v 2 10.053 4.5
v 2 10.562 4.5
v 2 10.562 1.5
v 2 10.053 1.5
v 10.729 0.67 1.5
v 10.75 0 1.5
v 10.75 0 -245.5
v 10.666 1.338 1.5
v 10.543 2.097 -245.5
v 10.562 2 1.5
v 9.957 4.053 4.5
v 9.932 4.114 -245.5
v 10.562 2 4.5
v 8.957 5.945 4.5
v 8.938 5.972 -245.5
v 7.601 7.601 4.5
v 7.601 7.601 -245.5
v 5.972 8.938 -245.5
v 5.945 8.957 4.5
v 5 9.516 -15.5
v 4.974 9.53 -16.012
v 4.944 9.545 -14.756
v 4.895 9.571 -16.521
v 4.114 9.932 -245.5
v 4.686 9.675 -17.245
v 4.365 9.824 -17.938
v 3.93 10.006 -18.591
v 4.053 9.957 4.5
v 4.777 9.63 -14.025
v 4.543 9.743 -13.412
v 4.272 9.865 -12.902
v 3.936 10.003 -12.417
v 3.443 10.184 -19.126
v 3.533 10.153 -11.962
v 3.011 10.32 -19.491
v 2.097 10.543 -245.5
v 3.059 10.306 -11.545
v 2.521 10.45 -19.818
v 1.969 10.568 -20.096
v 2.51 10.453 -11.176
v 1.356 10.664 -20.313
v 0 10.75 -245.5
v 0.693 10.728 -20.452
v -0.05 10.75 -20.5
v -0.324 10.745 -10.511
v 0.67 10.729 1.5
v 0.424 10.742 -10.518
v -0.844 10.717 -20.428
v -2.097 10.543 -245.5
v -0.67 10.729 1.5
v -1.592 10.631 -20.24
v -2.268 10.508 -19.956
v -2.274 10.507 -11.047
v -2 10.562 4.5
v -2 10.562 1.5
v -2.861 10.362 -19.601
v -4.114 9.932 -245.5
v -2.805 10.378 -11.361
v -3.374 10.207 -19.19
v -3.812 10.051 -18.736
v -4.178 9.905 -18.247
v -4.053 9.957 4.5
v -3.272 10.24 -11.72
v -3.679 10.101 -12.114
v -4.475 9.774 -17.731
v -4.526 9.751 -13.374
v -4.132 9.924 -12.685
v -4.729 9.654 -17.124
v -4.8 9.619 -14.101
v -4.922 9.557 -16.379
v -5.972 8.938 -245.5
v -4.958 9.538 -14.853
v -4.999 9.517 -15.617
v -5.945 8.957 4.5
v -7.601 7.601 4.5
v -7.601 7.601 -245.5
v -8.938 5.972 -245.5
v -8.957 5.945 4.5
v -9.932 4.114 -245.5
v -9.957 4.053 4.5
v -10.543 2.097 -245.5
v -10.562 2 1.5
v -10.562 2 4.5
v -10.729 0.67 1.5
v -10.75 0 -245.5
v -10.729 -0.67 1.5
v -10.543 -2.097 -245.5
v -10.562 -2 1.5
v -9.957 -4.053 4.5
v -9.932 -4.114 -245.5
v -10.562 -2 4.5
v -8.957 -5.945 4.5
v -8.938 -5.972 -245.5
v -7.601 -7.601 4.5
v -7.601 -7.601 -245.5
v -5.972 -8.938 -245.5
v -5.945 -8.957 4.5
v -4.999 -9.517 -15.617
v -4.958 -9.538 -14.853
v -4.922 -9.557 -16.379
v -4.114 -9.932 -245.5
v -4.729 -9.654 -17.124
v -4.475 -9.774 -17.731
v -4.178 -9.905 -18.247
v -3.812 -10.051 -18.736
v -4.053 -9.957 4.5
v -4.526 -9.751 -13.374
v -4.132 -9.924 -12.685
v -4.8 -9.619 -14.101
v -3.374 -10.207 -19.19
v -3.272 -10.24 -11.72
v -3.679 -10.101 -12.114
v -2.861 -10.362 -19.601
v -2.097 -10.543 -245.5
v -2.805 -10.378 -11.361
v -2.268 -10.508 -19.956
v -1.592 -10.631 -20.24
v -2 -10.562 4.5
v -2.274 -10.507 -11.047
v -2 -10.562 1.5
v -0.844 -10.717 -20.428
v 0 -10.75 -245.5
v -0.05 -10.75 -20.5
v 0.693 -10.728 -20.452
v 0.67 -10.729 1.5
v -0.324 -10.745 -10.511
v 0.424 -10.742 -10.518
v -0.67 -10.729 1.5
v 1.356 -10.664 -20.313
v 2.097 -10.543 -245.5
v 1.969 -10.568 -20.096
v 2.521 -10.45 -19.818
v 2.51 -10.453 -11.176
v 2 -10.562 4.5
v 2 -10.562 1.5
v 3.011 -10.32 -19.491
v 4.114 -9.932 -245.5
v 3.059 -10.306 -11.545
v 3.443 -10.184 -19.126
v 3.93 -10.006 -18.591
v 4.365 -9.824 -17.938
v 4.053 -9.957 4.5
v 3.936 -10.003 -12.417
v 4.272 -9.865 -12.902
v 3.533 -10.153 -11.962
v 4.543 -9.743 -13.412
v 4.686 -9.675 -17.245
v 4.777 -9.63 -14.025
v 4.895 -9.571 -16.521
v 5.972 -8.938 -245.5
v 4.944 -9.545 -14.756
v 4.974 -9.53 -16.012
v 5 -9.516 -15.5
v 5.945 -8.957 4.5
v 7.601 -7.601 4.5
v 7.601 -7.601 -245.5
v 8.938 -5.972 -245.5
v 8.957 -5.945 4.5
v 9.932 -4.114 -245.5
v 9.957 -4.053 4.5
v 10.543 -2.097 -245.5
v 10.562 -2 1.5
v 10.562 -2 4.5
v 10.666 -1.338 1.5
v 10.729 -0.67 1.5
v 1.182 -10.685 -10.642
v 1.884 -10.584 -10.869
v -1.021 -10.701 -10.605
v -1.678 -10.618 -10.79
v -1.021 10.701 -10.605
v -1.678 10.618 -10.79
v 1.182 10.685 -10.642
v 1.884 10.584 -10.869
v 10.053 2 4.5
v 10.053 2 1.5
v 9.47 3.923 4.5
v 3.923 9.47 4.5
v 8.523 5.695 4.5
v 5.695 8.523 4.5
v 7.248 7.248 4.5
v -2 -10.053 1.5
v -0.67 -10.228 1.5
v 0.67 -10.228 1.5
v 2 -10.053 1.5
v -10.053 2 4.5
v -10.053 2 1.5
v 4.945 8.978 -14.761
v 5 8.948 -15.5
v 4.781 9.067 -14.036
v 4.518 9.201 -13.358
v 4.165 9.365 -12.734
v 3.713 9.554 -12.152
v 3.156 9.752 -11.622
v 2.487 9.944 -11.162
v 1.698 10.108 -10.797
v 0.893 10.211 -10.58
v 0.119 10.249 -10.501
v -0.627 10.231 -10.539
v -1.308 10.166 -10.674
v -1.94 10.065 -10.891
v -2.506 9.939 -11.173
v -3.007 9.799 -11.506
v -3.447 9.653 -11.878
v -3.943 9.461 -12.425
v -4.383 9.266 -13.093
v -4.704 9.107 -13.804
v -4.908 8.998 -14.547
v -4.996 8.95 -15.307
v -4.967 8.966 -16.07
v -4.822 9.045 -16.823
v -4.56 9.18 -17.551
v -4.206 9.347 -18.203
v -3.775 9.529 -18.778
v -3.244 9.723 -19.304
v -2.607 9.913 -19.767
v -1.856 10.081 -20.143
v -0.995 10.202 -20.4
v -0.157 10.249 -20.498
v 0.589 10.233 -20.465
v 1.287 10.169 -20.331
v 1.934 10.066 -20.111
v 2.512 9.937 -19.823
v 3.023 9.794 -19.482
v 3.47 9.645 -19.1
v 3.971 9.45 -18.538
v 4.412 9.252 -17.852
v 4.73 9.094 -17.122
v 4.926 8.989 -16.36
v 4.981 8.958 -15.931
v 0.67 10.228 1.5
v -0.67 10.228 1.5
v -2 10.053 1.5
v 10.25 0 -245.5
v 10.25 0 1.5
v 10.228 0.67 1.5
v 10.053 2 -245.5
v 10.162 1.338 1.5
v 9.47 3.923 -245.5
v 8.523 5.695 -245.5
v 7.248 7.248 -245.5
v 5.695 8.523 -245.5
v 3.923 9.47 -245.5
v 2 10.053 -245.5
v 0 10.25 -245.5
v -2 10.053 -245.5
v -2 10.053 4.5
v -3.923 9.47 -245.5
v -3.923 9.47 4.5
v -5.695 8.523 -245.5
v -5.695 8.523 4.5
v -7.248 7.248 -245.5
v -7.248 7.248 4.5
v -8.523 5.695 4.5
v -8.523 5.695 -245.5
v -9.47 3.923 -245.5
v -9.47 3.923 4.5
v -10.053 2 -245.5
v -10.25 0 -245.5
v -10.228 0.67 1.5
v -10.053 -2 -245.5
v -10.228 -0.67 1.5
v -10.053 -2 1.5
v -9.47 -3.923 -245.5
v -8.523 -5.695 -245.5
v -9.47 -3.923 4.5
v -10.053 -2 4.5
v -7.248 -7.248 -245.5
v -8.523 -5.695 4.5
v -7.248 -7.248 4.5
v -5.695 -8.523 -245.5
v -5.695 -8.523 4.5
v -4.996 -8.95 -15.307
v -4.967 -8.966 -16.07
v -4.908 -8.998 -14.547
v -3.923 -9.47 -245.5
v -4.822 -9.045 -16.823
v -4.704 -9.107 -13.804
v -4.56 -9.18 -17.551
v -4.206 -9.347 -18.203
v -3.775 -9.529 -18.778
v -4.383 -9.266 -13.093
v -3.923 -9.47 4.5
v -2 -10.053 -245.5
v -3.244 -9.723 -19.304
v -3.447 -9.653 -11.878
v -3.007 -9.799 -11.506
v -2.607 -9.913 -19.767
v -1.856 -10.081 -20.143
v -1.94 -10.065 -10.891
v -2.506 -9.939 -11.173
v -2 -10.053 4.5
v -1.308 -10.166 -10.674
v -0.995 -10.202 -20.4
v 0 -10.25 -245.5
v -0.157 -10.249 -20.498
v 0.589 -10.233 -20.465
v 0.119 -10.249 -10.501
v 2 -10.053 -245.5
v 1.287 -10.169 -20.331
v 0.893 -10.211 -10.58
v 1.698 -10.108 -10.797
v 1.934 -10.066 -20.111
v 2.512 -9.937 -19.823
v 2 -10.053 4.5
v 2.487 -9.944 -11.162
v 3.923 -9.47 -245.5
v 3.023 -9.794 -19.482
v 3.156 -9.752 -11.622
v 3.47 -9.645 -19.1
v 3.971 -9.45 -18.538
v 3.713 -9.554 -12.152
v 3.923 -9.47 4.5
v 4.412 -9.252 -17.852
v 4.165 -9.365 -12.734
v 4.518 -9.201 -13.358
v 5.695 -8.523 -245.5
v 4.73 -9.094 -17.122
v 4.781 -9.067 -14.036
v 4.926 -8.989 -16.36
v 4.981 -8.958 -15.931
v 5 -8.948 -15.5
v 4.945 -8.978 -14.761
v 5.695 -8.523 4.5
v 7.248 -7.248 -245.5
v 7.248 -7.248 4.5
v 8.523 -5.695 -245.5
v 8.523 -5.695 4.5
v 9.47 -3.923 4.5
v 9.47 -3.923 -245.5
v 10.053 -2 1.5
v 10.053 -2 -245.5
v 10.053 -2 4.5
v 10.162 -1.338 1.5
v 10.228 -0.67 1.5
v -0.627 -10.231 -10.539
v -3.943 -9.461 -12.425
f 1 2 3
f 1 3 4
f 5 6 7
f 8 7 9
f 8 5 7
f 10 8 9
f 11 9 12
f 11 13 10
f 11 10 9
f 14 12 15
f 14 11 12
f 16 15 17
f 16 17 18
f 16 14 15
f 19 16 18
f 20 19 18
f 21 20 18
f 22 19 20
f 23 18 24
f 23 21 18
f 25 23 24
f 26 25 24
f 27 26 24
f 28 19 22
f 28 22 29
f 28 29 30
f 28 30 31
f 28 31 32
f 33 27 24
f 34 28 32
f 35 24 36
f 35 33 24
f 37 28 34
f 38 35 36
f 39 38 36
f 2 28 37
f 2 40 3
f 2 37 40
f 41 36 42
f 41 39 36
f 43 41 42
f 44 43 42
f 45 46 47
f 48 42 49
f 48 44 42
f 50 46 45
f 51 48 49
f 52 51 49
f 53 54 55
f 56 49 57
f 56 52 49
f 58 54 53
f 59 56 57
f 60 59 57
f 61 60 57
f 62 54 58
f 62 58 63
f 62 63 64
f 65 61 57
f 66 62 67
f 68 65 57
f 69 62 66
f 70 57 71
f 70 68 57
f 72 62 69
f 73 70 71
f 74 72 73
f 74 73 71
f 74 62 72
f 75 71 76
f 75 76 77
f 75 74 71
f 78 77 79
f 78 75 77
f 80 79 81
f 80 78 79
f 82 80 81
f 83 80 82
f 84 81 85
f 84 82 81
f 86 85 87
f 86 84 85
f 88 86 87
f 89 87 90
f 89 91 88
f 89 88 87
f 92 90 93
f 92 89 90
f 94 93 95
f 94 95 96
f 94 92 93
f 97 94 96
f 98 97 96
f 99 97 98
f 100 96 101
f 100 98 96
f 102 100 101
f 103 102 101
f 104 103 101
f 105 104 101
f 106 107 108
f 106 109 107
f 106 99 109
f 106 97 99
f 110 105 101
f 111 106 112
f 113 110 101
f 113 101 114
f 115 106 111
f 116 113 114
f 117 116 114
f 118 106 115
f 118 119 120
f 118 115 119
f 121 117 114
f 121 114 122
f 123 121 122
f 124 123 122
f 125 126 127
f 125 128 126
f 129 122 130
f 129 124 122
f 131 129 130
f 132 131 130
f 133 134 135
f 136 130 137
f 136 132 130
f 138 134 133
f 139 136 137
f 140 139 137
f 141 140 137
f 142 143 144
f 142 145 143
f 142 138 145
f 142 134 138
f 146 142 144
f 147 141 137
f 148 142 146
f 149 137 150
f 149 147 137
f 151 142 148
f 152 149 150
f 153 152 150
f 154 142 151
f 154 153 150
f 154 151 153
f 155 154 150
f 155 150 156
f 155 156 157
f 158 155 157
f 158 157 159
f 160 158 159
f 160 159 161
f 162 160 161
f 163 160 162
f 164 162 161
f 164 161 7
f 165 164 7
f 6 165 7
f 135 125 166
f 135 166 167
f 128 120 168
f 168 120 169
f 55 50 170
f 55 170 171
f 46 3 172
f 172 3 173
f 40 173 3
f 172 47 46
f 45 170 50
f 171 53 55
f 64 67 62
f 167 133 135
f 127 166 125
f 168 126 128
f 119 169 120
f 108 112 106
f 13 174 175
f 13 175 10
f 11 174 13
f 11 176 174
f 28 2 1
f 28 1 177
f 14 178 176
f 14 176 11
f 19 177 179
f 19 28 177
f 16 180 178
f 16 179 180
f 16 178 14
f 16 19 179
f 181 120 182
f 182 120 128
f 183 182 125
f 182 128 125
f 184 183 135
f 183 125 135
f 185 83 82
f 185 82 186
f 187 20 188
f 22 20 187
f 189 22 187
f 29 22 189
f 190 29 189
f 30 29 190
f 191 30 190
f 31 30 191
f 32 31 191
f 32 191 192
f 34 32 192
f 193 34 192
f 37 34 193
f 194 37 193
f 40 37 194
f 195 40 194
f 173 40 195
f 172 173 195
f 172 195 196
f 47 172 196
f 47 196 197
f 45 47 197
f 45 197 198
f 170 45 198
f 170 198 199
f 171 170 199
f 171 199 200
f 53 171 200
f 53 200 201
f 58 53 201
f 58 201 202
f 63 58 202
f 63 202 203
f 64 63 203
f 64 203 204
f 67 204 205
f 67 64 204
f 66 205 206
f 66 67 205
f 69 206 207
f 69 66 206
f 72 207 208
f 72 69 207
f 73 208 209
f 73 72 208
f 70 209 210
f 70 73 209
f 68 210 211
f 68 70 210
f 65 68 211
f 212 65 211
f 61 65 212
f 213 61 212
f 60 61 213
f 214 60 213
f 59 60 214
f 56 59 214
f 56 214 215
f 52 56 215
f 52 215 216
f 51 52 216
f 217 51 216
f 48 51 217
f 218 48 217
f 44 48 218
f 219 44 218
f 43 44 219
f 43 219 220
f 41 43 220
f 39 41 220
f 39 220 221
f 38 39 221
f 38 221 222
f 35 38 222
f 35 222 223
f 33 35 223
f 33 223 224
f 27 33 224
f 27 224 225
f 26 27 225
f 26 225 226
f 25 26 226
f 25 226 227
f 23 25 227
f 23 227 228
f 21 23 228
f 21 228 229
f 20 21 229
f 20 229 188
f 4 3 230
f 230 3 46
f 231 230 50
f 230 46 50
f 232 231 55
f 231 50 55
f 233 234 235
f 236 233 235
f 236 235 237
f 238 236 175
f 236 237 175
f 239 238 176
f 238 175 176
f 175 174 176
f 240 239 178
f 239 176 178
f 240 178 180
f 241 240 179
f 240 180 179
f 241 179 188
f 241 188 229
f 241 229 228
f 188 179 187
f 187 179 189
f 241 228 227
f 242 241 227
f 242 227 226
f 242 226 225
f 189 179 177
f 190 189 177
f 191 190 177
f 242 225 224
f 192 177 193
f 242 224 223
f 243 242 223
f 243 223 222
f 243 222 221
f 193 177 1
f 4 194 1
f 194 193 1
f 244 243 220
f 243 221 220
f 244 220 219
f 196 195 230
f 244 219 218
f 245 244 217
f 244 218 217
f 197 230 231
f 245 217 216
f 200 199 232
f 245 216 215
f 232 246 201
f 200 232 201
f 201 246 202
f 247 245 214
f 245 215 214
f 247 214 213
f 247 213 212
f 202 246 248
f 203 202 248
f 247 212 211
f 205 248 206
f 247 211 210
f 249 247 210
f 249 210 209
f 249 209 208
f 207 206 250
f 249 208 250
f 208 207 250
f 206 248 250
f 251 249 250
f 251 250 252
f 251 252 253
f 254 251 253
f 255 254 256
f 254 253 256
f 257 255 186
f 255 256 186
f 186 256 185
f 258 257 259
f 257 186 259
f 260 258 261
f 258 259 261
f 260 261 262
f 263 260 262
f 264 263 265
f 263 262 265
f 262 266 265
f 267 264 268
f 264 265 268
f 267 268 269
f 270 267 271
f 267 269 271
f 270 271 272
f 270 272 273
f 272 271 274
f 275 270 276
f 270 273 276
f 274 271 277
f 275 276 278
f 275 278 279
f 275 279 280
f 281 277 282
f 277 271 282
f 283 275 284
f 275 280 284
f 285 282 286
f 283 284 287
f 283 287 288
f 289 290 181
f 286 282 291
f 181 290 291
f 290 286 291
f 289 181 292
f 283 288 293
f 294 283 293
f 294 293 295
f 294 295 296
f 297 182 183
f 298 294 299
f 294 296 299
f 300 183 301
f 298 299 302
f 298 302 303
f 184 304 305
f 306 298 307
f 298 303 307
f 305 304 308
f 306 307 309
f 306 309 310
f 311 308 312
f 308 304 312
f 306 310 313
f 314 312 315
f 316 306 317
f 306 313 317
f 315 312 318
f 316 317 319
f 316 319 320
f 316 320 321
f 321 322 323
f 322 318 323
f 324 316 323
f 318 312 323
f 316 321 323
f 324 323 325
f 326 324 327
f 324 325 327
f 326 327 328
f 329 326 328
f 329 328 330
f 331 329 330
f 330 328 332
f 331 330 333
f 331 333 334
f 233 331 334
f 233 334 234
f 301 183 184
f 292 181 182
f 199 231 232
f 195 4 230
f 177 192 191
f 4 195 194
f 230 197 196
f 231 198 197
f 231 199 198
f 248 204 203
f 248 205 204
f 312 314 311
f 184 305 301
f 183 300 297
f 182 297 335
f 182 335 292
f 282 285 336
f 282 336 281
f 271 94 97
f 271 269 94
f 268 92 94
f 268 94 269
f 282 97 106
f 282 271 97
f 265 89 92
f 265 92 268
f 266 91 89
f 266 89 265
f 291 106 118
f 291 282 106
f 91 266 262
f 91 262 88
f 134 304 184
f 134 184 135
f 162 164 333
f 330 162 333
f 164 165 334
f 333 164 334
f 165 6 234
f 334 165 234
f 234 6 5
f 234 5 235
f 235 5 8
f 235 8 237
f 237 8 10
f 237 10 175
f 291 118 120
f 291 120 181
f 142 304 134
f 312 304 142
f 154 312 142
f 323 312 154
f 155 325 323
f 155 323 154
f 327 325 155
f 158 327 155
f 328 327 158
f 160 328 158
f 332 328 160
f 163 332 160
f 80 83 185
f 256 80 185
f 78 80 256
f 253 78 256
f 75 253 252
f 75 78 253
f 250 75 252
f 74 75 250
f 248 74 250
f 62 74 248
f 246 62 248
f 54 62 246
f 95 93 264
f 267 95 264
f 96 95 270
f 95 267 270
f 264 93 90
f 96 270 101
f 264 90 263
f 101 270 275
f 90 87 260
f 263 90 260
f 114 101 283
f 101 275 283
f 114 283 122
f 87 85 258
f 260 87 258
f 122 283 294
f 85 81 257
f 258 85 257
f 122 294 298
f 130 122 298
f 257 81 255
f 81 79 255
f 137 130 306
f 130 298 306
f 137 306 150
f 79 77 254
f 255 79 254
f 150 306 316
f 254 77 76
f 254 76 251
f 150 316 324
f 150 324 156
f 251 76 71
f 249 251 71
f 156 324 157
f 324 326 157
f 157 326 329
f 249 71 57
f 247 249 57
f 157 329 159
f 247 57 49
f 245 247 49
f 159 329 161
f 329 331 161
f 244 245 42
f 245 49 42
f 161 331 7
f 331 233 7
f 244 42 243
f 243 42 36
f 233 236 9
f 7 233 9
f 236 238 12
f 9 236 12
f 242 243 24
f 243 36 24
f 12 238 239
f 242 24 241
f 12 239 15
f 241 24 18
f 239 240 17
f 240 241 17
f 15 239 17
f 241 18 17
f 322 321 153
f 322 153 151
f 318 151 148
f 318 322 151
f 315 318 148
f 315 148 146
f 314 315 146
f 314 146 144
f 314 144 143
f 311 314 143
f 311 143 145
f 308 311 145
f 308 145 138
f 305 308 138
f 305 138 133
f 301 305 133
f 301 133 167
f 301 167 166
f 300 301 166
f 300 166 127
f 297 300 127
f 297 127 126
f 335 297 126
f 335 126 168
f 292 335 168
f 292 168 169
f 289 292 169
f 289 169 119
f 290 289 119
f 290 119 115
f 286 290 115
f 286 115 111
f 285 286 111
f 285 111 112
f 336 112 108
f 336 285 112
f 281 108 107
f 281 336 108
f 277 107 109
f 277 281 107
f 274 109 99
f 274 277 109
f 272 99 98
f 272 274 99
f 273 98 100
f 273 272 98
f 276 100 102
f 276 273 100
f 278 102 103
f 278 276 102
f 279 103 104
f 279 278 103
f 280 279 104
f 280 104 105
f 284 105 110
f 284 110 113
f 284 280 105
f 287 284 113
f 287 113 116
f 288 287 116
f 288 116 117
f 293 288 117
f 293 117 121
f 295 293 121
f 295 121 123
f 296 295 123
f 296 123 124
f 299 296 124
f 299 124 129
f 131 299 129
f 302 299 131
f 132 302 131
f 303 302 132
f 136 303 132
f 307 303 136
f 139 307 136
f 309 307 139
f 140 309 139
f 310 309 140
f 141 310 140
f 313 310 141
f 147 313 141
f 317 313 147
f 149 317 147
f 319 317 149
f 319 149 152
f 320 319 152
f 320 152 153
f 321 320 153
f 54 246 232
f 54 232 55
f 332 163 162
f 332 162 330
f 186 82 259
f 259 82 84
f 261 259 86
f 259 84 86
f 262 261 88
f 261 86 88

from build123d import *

# Parameters (mm, degrees)
SKETCH023_R           = 10.75
SKETCH023_R_2         = 10.25
PAD011_DEPTH          = 250
POCKET009_DEPTH       = 3
POLARPATTERN003_COUNT = 4
CYLINDER002_R         = 5
CYLINDER002_DEPTH     = 24


with BuildPart() as part:
    # Sketch023 → Pad011 (new body)
    with BuildSketch(Plane.XY):
        Circle(SKETCH023_R)
        Circle(SKETCH023_R_2, mode=Mode.SUBTRACT)
    extrude(amount=-PAD011_DEPTH)

    # Sketch024 → Pocket009 (cut)
    with BuildSketch(Plane.XY):
        Polygon((0, 12.14), (2, 12.14), (2, 2), (12.14, 2), (12.14, 0), (0, 0), align=None)
    pocket009 = extrude(amount=-POCKET009_DEPTH, mode=Mode.SUBTRACT)

    # PolarPattern003: Pocket009 ×4 about axis
    polarpattern003_axis = Axis((0, 0, 0), (0, 0, 1))
    for i in range(1, POLARPATTERN003_COUNT):
        add(pocket009.rotate(polarpattern003_axis, i * 360 / POLARPATTERN003_COUNT), mode=Mode.SUBTRACT)

    # Cylinder002 → Cylinder002 (cut)
    with BuildSketch(Plane(origin=(0, 12, -20), x_dir=(1, 0, 0), z_dir=(0, -1, 0))):
        Circle(CYLINDER002_R)
    extrude(amount=CYLINDER002_DEPTH, mode=Mode.SUBTRACT)


with BuildPart() as part_1:
    # Body011 placement: moved
    add(part.part.moved(Location((0, 0, 4.5))))


solid = part_1.part
